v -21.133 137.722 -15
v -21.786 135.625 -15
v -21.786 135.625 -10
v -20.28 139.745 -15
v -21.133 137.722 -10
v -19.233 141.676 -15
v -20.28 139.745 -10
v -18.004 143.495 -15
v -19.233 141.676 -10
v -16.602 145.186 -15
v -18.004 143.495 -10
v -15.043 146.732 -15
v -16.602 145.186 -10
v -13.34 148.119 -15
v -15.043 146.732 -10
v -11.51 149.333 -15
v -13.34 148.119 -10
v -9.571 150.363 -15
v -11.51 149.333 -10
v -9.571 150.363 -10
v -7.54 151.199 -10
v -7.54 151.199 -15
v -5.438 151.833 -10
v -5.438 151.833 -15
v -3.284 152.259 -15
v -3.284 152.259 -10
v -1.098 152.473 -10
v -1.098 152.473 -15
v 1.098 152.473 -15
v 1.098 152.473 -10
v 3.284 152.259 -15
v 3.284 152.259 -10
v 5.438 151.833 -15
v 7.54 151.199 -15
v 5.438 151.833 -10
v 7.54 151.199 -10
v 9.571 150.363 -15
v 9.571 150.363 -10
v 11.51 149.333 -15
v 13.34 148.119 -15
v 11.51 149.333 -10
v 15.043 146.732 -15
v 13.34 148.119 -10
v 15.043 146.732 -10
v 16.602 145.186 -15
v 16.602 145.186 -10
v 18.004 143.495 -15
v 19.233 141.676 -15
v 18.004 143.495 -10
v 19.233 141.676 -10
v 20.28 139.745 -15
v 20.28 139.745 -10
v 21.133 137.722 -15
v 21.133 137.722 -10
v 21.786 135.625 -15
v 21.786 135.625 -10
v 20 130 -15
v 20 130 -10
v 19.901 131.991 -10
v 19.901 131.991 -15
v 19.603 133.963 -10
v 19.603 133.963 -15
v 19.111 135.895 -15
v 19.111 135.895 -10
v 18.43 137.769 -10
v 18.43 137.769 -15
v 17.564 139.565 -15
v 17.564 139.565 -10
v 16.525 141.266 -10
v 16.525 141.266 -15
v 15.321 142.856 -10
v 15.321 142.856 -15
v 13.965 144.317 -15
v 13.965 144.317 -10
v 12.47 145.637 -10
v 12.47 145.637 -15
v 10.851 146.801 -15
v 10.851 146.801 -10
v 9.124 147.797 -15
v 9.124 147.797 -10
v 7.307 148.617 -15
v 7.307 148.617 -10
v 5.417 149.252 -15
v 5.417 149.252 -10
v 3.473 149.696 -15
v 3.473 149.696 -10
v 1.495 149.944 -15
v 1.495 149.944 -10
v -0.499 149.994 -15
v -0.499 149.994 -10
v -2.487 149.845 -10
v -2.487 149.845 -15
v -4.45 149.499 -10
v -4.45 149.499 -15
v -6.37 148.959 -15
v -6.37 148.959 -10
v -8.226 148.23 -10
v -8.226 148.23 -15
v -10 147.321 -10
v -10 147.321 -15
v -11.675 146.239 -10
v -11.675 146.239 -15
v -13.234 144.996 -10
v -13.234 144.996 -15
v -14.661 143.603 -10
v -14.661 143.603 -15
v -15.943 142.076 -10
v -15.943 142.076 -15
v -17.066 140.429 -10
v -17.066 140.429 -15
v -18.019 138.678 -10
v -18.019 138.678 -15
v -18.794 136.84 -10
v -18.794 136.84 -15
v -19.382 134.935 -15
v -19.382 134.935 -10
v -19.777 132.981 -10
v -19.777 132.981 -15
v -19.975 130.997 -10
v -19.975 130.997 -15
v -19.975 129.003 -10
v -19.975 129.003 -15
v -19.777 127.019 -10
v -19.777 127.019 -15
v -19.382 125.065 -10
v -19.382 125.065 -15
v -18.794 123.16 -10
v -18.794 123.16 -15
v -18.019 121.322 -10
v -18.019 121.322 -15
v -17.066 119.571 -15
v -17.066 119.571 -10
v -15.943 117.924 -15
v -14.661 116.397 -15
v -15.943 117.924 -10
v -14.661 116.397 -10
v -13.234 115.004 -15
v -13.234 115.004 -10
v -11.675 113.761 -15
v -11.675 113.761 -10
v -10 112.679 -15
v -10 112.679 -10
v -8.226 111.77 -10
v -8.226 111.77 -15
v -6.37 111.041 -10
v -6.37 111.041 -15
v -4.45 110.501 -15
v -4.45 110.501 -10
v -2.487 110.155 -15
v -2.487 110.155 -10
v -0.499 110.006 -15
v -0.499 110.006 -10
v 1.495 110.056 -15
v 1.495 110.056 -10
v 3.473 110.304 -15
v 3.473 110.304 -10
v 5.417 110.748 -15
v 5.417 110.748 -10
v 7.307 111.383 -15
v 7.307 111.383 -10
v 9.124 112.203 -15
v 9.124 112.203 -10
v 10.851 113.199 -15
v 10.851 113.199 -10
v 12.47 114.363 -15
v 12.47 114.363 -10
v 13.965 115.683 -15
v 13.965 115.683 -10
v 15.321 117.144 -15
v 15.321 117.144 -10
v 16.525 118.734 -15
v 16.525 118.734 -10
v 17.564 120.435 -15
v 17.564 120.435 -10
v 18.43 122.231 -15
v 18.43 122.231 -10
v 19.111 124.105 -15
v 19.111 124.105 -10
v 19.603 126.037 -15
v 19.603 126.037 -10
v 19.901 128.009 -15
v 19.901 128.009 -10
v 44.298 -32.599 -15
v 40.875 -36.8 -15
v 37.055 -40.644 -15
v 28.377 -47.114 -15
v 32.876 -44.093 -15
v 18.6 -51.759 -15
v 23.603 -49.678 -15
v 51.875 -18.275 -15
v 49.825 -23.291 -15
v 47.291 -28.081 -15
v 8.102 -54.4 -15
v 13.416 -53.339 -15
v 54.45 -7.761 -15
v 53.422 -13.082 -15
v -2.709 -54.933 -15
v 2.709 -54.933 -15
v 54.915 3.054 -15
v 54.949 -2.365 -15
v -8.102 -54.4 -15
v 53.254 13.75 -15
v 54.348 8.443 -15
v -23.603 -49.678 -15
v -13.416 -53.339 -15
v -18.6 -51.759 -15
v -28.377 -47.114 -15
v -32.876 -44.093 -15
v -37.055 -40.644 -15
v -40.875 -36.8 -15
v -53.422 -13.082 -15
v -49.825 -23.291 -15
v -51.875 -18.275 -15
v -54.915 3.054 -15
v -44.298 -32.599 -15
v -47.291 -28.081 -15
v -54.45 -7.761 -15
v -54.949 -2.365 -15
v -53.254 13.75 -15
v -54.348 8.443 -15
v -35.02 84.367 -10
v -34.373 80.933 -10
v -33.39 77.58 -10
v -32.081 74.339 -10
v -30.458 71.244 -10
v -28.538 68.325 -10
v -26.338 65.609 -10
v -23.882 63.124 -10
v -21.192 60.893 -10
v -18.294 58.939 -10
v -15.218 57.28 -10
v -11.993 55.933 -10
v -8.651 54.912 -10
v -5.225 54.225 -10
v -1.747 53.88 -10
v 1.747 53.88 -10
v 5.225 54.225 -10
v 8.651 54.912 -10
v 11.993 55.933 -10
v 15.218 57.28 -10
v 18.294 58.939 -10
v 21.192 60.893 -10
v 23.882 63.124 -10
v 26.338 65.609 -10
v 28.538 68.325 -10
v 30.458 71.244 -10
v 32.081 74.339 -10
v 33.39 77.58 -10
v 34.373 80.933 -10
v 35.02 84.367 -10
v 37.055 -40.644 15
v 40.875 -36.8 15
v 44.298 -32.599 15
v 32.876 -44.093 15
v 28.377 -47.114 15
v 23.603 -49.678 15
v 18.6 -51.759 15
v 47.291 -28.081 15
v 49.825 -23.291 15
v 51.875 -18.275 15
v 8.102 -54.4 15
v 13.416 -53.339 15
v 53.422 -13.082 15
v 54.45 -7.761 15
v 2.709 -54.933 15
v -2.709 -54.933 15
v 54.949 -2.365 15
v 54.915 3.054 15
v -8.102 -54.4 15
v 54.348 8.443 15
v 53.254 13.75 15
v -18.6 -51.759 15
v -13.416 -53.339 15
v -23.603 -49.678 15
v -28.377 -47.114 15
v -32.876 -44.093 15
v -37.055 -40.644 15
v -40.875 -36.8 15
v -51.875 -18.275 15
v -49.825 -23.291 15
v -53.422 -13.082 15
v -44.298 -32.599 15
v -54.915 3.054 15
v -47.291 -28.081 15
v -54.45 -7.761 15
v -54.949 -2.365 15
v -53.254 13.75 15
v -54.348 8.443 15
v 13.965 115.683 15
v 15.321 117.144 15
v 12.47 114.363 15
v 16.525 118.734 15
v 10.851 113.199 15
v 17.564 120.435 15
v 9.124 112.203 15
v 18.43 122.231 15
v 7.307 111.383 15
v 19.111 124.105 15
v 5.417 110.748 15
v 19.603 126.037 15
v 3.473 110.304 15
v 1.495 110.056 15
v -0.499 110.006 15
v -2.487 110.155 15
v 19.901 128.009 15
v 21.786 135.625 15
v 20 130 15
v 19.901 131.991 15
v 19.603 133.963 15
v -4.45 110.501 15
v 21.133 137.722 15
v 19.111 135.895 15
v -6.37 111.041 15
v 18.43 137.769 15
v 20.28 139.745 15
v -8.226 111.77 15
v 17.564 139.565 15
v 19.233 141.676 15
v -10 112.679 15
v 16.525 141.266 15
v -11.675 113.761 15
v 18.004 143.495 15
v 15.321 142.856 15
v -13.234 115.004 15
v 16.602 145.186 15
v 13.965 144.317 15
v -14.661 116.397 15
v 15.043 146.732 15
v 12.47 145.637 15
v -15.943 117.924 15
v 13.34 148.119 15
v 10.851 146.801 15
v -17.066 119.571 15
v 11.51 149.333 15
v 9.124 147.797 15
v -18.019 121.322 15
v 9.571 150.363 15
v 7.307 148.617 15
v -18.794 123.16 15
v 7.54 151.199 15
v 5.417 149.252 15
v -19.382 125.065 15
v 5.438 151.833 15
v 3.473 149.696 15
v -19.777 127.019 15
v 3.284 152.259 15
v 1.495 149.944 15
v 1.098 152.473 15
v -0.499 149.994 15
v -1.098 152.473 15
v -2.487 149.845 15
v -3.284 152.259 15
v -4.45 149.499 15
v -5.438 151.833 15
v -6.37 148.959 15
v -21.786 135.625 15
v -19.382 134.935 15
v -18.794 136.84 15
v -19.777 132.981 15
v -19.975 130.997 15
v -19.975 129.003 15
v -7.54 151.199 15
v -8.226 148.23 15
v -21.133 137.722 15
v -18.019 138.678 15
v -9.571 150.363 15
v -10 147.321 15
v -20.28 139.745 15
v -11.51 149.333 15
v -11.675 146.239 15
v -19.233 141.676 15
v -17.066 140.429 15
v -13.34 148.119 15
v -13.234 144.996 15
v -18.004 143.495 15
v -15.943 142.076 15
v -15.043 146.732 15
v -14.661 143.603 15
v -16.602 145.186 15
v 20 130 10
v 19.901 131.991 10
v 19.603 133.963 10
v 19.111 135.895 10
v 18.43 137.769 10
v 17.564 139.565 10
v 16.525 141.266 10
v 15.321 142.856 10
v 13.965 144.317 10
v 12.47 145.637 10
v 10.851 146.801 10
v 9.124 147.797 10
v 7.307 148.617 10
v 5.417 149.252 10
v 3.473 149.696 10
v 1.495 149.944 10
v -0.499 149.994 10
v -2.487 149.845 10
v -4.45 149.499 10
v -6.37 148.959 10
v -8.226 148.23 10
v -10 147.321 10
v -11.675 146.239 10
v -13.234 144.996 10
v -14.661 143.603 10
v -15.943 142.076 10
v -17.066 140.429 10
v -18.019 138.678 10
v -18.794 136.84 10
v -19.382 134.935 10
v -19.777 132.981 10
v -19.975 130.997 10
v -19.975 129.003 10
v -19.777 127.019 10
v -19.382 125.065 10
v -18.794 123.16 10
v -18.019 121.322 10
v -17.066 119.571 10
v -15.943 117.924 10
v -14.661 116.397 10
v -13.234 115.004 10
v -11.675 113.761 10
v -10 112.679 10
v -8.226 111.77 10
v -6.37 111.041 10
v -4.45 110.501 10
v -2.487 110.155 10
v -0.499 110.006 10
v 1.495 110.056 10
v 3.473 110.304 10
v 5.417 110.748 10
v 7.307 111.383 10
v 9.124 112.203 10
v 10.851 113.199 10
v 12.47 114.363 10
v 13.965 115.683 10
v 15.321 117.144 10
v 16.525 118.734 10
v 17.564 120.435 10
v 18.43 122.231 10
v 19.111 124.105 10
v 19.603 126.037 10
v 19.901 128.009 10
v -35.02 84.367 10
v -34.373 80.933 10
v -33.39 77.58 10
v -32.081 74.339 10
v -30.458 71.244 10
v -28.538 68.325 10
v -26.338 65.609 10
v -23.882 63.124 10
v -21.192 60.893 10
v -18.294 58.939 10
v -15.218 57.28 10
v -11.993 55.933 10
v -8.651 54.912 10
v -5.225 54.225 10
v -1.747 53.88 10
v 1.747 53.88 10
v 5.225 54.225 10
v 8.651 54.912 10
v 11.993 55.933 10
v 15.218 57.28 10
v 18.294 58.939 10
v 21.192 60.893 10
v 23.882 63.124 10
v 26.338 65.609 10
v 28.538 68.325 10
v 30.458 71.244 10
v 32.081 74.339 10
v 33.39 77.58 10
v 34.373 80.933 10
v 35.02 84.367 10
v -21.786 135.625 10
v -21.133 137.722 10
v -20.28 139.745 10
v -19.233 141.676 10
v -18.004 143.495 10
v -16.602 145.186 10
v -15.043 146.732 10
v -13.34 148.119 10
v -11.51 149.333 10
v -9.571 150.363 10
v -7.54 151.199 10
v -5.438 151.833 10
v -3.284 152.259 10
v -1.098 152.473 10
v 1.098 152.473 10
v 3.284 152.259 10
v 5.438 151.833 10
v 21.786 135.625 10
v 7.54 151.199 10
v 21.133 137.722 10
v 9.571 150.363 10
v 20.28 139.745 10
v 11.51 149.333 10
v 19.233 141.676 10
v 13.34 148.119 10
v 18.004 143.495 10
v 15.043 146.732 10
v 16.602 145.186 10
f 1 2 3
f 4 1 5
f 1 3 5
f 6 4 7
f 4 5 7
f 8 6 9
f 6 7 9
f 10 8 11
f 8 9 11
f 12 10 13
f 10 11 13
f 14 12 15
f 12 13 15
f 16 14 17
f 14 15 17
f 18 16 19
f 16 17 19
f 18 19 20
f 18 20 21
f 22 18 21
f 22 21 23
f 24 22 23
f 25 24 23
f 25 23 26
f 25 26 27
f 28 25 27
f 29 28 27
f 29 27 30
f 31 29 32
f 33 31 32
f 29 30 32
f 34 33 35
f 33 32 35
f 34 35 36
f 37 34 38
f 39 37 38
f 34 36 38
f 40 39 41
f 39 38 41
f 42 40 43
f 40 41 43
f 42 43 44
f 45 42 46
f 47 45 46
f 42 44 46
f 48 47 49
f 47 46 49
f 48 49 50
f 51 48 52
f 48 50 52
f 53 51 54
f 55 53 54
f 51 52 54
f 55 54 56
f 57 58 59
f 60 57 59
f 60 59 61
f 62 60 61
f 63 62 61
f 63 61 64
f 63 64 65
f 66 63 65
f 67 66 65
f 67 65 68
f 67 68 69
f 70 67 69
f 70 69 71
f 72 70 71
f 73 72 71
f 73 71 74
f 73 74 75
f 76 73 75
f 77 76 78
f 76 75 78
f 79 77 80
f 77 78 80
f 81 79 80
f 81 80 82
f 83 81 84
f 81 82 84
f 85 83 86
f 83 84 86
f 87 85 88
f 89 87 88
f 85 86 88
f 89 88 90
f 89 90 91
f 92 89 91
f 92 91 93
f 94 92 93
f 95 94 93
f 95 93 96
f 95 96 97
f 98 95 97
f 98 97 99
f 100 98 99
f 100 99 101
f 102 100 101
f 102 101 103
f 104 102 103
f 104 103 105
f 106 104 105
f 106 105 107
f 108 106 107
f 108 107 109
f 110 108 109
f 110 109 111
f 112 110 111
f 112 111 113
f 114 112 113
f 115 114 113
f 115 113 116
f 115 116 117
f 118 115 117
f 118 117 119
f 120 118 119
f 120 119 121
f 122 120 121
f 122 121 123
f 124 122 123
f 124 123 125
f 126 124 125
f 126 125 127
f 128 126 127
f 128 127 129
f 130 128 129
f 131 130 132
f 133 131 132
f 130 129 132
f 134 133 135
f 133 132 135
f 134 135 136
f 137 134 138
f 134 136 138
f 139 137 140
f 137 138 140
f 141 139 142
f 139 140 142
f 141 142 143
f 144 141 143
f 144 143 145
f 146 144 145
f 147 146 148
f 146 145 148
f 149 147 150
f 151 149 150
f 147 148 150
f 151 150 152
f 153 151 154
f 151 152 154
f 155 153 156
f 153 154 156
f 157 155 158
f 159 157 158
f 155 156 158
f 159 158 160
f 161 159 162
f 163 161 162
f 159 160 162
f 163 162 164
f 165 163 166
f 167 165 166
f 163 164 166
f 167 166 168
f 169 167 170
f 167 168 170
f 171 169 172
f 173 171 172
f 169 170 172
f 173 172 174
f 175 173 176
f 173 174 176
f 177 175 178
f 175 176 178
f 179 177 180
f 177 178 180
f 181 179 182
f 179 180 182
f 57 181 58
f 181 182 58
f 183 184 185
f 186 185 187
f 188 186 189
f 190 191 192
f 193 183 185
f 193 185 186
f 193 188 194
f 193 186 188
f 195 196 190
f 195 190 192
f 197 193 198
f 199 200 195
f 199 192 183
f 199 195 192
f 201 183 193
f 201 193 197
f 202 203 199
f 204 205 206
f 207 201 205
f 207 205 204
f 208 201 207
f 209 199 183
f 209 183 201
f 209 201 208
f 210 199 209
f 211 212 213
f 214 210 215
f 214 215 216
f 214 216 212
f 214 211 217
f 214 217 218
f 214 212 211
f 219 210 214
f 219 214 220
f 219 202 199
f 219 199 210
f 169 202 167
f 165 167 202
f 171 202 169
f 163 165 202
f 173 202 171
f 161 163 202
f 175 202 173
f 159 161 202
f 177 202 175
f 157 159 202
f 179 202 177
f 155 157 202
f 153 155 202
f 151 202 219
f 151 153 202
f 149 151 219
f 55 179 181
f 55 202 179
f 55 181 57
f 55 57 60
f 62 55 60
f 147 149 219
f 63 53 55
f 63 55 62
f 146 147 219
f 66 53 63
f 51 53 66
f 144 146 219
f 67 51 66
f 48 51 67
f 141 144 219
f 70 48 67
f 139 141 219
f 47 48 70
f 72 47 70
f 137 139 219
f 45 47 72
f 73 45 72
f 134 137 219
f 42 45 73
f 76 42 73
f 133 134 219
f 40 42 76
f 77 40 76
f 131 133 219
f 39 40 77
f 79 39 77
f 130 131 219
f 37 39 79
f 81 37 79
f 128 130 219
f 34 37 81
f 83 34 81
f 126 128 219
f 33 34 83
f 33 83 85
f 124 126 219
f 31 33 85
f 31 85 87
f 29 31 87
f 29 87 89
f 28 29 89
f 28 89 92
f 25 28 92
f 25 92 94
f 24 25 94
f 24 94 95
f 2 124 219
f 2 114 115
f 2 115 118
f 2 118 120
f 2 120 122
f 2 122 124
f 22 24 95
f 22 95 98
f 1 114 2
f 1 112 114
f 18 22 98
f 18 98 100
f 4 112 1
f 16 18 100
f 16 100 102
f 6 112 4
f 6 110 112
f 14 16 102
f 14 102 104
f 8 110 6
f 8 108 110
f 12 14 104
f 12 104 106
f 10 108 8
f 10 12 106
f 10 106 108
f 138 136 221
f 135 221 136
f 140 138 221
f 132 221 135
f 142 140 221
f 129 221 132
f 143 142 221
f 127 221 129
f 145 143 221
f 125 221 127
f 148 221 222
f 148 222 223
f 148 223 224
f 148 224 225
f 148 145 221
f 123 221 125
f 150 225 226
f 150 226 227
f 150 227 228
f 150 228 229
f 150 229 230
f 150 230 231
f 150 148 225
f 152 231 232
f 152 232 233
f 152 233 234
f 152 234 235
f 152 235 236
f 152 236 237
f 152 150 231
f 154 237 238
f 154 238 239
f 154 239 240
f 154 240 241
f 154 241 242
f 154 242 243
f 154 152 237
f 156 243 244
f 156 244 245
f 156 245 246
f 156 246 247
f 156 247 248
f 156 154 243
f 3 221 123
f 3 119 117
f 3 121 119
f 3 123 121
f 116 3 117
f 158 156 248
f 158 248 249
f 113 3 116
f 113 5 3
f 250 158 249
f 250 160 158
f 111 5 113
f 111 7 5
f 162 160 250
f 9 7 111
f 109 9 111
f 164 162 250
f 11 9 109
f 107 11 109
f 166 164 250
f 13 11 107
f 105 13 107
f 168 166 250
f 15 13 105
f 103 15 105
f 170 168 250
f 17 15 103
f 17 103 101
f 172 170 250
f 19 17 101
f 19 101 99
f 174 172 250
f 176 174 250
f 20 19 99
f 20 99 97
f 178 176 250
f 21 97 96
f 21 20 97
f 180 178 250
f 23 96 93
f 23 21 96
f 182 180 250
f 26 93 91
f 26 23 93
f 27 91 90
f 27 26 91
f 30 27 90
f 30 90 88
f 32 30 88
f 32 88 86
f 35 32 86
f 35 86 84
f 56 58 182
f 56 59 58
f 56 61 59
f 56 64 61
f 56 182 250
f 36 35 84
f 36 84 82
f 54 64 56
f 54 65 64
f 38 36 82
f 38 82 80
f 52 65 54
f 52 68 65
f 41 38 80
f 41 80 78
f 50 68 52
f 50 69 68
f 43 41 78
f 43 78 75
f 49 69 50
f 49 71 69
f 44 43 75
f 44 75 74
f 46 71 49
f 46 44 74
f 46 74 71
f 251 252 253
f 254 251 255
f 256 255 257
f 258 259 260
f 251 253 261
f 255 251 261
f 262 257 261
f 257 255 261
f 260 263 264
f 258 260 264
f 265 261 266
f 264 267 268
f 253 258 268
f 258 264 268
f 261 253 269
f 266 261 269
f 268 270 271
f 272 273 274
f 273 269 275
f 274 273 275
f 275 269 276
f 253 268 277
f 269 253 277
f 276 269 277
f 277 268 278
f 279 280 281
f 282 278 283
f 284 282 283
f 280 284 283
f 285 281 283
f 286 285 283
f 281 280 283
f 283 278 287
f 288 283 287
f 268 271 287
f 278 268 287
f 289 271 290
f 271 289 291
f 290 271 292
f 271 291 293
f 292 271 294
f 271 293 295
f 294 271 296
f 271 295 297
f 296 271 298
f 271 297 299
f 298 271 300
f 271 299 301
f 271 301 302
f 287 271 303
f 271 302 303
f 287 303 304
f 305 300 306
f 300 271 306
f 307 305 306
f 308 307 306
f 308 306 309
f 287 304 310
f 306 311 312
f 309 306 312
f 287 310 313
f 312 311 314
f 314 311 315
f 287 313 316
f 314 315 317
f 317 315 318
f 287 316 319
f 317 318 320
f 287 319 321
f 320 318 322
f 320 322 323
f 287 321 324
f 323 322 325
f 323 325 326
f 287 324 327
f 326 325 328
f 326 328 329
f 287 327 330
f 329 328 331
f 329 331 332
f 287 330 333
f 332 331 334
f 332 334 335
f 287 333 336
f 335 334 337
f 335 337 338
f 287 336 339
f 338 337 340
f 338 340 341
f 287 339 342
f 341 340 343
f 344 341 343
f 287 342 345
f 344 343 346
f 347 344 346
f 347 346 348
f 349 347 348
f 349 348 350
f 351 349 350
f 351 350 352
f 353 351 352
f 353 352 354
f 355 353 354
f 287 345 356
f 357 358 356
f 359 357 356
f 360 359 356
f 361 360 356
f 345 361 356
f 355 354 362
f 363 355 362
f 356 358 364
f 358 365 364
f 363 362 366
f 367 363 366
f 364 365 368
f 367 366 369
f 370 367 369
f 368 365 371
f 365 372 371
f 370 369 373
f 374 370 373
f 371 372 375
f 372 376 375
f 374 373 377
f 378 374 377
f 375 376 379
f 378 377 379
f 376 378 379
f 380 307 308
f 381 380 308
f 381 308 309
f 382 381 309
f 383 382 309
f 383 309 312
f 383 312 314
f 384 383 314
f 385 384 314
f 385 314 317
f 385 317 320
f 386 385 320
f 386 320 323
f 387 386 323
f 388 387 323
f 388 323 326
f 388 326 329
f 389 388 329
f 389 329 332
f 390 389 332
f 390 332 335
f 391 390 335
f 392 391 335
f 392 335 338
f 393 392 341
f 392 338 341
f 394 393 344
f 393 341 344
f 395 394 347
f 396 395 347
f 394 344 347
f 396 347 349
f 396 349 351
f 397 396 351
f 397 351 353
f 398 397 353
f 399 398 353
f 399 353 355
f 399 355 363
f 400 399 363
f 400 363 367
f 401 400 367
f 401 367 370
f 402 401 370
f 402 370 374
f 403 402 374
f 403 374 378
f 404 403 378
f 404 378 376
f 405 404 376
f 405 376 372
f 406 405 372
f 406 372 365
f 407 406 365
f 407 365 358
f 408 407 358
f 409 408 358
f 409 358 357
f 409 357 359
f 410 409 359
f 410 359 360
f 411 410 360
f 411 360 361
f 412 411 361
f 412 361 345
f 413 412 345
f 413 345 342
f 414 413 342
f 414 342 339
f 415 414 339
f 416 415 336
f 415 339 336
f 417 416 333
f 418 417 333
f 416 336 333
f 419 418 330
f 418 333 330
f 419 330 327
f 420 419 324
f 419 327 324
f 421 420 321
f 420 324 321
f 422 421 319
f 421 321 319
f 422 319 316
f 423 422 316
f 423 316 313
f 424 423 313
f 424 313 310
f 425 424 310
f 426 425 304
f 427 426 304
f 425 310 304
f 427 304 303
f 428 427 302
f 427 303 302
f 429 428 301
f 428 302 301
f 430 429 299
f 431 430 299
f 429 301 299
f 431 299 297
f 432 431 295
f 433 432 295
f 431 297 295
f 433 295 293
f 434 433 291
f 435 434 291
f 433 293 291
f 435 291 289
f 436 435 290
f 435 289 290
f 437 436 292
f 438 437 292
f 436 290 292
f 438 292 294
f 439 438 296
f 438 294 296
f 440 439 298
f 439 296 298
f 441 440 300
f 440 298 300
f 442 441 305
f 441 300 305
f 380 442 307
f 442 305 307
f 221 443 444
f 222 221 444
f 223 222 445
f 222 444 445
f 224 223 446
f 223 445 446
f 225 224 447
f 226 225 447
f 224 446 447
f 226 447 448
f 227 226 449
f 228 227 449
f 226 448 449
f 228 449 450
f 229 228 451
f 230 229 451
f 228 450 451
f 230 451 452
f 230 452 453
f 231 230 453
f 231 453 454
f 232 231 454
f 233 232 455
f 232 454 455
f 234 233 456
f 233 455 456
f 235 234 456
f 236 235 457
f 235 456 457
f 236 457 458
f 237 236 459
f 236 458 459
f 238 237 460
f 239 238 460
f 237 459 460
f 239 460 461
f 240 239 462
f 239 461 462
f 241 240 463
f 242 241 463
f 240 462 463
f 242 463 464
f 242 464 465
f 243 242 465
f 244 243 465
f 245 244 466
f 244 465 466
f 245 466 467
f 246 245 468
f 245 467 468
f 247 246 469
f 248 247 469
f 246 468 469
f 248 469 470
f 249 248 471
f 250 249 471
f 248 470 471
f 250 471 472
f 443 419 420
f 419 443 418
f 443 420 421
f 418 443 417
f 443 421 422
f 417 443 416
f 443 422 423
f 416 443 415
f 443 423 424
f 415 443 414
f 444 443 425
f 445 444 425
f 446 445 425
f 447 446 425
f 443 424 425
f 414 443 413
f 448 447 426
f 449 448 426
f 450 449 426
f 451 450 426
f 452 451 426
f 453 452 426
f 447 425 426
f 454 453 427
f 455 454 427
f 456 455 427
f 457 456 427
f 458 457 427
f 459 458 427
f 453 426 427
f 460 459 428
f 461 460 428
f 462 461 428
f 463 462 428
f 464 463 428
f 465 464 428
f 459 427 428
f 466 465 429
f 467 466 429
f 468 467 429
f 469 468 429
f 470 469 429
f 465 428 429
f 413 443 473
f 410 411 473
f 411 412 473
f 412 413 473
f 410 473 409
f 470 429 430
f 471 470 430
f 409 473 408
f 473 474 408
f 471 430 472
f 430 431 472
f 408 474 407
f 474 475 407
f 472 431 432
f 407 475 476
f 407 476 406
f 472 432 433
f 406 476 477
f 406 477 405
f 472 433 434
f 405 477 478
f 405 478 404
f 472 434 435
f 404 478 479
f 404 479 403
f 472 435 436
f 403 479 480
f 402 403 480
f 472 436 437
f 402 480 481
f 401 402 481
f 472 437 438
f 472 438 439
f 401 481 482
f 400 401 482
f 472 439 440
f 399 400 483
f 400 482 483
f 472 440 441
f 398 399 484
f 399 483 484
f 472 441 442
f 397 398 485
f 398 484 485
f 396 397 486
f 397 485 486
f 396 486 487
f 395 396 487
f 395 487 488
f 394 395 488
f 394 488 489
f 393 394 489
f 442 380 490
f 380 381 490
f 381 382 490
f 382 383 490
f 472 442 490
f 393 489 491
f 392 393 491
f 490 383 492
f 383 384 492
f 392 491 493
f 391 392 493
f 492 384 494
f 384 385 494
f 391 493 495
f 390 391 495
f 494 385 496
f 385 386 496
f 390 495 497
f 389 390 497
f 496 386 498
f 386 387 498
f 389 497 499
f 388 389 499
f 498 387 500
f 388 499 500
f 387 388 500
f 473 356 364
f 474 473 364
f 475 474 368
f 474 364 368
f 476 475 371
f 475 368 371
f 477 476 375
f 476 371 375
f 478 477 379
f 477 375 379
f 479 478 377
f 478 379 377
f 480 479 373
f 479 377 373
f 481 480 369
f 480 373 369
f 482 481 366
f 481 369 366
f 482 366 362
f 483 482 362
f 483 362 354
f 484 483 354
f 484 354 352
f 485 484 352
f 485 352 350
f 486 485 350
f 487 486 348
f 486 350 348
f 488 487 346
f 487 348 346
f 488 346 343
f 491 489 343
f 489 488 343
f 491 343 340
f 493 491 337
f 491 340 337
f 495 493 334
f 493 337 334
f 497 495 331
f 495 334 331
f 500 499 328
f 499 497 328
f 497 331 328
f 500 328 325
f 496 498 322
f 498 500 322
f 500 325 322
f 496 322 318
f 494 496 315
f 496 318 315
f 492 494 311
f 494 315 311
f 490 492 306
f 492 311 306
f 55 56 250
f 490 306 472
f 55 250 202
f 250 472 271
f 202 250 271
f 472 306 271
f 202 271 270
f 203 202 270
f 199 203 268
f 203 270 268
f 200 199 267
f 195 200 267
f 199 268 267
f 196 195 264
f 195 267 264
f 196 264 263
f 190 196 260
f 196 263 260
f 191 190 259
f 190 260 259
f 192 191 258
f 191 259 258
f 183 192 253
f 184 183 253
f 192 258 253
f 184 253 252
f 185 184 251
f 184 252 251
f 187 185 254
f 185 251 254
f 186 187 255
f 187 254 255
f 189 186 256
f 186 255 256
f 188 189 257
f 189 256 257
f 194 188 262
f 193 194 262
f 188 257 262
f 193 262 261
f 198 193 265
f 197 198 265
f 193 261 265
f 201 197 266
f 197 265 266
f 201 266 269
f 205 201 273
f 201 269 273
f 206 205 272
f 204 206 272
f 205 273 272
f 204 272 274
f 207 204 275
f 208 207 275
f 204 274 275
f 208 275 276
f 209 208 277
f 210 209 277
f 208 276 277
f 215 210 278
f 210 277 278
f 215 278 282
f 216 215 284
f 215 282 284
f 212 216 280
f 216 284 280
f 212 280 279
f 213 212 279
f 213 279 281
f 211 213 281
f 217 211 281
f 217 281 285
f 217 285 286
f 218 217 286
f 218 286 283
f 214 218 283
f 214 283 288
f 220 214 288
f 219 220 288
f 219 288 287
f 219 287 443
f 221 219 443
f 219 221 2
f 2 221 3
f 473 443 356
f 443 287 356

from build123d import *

# Parameters (mm, degrees)
BOSS_EXTRUDE1_DEPTH = 15
SKETCH2_R           = 20
CUT_EXTRUDE1_DEPTH  = 45
CUT_EXTRUDE2_DEPTH  = 10


with BuildPart() as part:
    # Sketch1 → Boss-Extrude1 (new, symmetric)
    with BuildSketch(Plane.XY):
        with BuildLine():
            Line((-53.25352101, 13.75), (-21.785531322, 135.625))
            ThreePointArc((-21.785531322, 135.625), (0, 152.5), (21.785531322, 135.625))
            Line((21.785531322, 135.625), (53.25352101, 13.75))
            ThreePointArc((53.25352101, 13.75), (0, -55), (-53.25352101, 13.75))
        make_face()
    extrude(amount=BOSS_EXTRUDE1_DEPTH, both=True)

    # Sketch2 → Cut-Extrude1 (cut)
    with BuildSketch(Plane.XY.offset(15)):
        with Locations((0, 130)):
            Circle(SKETCH2_R)
    extrude(amount=-CUT_EXTRUDE1_DEPTH, mode=Mode.SUBTRACT)

    # Sketch4 → Cut-Extrude2 (cut, symmetric)
    with BuildSketch(Plane.XY):
        with BuildLine():
            Line((-21.785531322, 135.625), (-35.020174222, 84.367448459))
            ThreePointArc((-35.020174222, 84.367448459), (0, 53.836754328), (35.020174222, 84.367448459))
            Line((35.020174222, 84.367448459), (21.785531322, 135.625))
            ThreePointArc((21.785531322, 135.625), (0, 152.5), (-21.785531322, 135.625))
        make_face()
    extrude(amount=CUT_EXTRUDE2_DEPTH, both=True, mode=Mode.SUBTRACT)


solid = part.part
